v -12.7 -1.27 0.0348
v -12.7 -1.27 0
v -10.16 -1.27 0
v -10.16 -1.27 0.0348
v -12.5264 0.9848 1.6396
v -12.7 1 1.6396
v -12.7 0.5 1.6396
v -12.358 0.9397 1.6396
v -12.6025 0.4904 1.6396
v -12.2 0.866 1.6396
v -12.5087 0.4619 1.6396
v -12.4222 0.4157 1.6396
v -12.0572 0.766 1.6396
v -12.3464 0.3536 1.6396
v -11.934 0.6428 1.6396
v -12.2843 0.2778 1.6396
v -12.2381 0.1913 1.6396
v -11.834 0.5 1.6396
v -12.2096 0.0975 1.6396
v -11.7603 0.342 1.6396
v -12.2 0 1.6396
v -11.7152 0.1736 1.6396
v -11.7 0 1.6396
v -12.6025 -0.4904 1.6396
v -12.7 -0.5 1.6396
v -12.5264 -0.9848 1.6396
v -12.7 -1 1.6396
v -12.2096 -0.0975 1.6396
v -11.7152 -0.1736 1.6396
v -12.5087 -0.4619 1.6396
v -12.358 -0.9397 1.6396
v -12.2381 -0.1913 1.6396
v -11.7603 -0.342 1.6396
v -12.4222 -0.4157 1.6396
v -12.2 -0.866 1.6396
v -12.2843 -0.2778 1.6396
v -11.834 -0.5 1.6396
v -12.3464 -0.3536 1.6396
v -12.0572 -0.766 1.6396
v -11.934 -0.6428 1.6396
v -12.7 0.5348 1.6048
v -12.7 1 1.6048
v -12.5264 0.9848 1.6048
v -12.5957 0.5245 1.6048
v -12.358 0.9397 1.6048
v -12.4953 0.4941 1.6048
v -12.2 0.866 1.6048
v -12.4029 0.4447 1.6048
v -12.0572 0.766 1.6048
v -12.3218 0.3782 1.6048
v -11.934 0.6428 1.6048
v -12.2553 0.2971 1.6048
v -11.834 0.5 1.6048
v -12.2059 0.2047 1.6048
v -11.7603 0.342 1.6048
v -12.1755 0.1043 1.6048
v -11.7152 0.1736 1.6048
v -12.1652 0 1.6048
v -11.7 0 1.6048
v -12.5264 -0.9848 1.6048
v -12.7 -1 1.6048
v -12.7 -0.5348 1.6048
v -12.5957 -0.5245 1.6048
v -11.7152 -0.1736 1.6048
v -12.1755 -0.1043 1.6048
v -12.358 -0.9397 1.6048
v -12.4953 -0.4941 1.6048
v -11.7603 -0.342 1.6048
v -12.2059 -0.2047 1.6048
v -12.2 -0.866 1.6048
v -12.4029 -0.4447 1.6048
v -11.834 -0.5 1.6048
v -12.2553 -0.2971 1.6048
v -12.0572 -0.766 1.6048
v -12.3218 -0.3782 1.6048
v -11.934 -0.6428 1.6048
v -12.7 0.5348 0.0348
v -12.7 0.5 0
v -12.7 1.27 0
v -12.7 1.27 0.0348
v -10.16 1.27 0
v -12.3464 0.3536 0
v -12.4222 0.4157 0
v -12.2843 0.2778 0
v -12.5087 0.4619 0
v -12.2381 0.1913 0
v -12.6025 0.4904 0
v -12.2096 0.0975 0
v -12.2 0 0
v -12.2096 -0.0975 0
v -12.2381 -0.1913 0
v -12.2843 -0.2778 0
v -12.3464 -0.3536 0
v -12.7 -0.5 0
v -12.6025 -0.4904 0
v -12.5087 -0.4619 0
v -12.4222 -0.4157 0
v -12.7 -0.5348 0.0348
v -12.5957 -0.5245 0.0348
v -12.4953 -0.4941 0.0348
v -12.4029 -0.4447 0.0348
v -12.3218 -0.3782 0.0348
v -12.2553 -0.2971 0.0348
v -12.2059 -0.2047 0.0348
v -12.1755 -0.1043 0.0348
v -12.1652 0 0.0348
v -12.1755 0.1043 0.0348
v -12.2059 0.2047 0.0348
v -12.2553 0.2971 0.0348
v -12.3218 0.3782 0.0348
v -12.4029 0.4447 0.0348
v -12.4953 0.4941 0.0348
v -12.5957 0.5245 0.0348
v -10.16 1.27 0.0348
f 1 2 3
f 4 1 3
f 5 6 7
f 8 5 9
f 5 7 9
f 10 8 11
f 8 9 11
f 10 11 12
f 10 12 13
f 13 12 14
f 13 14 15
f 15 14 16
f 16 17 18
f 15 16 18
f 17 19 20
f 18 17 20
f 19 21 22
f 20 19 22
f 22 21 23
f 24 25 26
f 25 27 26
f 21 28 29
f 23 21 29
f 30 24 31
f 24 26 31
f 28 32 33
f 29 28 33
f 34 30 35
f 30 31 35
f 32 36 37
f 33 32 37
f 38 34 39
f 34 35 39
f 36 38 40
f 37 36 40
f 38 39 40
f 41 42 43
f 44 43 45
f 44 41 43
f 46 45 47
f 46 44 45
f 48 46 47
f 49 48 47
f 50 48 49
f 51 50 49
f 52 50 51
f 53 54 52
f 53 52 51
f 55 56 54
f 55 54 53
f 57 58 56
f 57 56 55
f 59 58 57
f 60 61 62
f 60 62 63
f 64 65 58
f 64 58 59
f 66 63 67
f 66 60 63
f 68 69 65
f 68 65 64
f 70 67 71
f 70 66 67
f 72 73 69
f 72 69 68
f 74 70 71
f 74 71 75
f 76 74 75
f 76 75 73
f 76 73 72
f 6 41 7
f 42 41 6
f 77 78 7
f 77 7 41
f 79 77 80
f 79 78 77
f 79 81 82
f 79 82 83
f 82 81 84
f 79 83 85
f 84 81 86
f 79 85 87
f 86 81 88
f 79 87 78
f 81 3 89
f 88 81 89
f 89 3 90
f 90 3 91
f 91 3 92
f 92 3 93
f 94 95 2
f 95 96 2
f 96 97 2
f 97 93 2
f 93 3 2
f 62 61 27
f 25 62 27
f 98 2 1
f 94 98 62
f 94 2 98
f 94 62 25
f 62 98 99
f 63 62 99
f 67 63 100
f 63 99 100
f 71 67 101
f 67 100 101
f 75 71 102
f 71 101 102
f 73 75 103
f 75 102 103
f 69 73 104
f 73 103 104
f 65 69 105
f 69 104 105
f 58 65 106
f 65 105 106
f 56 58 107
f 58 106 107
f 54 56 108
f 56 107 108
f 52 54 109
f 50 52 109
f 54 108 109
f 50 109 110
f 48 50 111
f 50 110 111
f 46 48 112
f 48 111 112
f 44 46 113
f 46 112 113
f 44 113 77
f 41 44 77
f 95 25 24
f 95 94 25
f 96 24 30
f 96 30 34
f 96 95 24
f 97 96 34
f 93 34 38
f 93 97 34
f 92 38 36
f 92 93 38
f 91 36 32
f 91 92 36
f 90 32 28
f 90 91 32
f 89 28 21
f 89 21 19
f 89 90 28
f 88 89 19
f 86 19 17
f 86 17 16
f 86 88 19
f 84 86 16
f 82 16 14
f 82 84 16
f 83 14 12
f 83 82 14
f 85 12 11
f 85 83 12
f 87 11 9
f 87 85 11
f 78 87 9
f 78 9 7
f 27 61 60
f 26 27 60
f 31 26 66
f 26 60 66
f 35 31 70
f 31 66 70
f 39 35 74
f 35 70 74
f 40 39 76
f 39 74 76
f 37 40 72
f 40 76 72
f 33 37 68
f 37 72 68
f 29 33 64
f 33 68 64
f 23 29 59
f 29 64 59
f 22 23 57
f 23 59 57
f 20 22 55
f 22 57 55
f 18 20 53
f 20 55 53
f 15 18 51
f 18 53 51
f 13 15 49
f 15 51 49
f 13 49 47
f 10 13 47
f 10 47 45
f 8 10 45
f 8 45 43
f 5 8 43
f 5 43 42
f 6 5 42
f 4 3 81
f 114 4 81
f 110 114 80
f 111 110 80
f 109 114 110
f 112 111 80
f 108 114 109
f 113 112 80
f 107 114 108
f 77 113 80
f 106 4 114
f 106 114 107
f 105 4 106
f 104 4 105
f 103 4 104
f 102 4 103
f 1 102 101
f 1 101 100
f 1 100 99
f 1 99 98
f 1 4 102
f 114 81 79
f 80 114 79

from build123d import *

# Parameters (mm, degrees)
PAD002_DEPTH            = 0.0348
PAD003_DEPTH            = 1.6048
PAD004_DEPTH            = 0.0348
BODY003_PLACEMENT_ANGLE = 180


with BuildPart() as part:
    # Sketch004 → Pad002 (new body)
    with BuildSketch(Plane.XY):
        with BuildLine():
            Line((-2.54, 1.27), (-2.54, -1.27))
            Line((-2.54, -1.27), (0, -1.27))
            Line((0, -1.27), (0, -0.5))
            ThreePointArc((0, 0.5), (-0.5, 0), (0, -0.5))
            Line((0, 0.5), (0, 1.27))
            Line((0, 1.27), (-2.54, 1.27))
        make_face()
    extrude(amount=PAD002_DEPTH)

    # Sketch005 → Pad003 (join)
    with BuildSketch(Plane.XY):
        with BuildLine():
            ThreePointArc((0, 0.5348), (-0.5348, 0), (0, -0.5348))
            Line((0, -0.5), (0, -0.5348))
            ThreePointArc((0, 0.5), (-0.5, 0), (0, -0.5))
            Line((0, 0.5348), (0, 0.5))
        make_face()
    extrude(amount=PAD003_DEPTH)

    # Sketch006 → Pad004 (join)
    with BuildSketch(Plane.XY.offset(1.6048)):
        with BuildLine():
            ThreePointArc((0, 0.5), (-0.5, 0), (0, -0.5))
            Line((0, -0.5), (0, -1))
            ThreePointArc((0, 1), (-1, 0), (0, -1))
            Line((0, 1), (0, 0.5))
        make_face()
    extrude(amount=PAD004_DEPTH)


with BuildPart() as part_1:
    # Body003 placement: moved
    add(part.part.moved(Location((-12.7, 0, 0))).rotate(Axis((-12.7, 0, 0), (0, 0, 1)), BODY003_PLACEMENT_ANGLE))


solid = part_1.part
